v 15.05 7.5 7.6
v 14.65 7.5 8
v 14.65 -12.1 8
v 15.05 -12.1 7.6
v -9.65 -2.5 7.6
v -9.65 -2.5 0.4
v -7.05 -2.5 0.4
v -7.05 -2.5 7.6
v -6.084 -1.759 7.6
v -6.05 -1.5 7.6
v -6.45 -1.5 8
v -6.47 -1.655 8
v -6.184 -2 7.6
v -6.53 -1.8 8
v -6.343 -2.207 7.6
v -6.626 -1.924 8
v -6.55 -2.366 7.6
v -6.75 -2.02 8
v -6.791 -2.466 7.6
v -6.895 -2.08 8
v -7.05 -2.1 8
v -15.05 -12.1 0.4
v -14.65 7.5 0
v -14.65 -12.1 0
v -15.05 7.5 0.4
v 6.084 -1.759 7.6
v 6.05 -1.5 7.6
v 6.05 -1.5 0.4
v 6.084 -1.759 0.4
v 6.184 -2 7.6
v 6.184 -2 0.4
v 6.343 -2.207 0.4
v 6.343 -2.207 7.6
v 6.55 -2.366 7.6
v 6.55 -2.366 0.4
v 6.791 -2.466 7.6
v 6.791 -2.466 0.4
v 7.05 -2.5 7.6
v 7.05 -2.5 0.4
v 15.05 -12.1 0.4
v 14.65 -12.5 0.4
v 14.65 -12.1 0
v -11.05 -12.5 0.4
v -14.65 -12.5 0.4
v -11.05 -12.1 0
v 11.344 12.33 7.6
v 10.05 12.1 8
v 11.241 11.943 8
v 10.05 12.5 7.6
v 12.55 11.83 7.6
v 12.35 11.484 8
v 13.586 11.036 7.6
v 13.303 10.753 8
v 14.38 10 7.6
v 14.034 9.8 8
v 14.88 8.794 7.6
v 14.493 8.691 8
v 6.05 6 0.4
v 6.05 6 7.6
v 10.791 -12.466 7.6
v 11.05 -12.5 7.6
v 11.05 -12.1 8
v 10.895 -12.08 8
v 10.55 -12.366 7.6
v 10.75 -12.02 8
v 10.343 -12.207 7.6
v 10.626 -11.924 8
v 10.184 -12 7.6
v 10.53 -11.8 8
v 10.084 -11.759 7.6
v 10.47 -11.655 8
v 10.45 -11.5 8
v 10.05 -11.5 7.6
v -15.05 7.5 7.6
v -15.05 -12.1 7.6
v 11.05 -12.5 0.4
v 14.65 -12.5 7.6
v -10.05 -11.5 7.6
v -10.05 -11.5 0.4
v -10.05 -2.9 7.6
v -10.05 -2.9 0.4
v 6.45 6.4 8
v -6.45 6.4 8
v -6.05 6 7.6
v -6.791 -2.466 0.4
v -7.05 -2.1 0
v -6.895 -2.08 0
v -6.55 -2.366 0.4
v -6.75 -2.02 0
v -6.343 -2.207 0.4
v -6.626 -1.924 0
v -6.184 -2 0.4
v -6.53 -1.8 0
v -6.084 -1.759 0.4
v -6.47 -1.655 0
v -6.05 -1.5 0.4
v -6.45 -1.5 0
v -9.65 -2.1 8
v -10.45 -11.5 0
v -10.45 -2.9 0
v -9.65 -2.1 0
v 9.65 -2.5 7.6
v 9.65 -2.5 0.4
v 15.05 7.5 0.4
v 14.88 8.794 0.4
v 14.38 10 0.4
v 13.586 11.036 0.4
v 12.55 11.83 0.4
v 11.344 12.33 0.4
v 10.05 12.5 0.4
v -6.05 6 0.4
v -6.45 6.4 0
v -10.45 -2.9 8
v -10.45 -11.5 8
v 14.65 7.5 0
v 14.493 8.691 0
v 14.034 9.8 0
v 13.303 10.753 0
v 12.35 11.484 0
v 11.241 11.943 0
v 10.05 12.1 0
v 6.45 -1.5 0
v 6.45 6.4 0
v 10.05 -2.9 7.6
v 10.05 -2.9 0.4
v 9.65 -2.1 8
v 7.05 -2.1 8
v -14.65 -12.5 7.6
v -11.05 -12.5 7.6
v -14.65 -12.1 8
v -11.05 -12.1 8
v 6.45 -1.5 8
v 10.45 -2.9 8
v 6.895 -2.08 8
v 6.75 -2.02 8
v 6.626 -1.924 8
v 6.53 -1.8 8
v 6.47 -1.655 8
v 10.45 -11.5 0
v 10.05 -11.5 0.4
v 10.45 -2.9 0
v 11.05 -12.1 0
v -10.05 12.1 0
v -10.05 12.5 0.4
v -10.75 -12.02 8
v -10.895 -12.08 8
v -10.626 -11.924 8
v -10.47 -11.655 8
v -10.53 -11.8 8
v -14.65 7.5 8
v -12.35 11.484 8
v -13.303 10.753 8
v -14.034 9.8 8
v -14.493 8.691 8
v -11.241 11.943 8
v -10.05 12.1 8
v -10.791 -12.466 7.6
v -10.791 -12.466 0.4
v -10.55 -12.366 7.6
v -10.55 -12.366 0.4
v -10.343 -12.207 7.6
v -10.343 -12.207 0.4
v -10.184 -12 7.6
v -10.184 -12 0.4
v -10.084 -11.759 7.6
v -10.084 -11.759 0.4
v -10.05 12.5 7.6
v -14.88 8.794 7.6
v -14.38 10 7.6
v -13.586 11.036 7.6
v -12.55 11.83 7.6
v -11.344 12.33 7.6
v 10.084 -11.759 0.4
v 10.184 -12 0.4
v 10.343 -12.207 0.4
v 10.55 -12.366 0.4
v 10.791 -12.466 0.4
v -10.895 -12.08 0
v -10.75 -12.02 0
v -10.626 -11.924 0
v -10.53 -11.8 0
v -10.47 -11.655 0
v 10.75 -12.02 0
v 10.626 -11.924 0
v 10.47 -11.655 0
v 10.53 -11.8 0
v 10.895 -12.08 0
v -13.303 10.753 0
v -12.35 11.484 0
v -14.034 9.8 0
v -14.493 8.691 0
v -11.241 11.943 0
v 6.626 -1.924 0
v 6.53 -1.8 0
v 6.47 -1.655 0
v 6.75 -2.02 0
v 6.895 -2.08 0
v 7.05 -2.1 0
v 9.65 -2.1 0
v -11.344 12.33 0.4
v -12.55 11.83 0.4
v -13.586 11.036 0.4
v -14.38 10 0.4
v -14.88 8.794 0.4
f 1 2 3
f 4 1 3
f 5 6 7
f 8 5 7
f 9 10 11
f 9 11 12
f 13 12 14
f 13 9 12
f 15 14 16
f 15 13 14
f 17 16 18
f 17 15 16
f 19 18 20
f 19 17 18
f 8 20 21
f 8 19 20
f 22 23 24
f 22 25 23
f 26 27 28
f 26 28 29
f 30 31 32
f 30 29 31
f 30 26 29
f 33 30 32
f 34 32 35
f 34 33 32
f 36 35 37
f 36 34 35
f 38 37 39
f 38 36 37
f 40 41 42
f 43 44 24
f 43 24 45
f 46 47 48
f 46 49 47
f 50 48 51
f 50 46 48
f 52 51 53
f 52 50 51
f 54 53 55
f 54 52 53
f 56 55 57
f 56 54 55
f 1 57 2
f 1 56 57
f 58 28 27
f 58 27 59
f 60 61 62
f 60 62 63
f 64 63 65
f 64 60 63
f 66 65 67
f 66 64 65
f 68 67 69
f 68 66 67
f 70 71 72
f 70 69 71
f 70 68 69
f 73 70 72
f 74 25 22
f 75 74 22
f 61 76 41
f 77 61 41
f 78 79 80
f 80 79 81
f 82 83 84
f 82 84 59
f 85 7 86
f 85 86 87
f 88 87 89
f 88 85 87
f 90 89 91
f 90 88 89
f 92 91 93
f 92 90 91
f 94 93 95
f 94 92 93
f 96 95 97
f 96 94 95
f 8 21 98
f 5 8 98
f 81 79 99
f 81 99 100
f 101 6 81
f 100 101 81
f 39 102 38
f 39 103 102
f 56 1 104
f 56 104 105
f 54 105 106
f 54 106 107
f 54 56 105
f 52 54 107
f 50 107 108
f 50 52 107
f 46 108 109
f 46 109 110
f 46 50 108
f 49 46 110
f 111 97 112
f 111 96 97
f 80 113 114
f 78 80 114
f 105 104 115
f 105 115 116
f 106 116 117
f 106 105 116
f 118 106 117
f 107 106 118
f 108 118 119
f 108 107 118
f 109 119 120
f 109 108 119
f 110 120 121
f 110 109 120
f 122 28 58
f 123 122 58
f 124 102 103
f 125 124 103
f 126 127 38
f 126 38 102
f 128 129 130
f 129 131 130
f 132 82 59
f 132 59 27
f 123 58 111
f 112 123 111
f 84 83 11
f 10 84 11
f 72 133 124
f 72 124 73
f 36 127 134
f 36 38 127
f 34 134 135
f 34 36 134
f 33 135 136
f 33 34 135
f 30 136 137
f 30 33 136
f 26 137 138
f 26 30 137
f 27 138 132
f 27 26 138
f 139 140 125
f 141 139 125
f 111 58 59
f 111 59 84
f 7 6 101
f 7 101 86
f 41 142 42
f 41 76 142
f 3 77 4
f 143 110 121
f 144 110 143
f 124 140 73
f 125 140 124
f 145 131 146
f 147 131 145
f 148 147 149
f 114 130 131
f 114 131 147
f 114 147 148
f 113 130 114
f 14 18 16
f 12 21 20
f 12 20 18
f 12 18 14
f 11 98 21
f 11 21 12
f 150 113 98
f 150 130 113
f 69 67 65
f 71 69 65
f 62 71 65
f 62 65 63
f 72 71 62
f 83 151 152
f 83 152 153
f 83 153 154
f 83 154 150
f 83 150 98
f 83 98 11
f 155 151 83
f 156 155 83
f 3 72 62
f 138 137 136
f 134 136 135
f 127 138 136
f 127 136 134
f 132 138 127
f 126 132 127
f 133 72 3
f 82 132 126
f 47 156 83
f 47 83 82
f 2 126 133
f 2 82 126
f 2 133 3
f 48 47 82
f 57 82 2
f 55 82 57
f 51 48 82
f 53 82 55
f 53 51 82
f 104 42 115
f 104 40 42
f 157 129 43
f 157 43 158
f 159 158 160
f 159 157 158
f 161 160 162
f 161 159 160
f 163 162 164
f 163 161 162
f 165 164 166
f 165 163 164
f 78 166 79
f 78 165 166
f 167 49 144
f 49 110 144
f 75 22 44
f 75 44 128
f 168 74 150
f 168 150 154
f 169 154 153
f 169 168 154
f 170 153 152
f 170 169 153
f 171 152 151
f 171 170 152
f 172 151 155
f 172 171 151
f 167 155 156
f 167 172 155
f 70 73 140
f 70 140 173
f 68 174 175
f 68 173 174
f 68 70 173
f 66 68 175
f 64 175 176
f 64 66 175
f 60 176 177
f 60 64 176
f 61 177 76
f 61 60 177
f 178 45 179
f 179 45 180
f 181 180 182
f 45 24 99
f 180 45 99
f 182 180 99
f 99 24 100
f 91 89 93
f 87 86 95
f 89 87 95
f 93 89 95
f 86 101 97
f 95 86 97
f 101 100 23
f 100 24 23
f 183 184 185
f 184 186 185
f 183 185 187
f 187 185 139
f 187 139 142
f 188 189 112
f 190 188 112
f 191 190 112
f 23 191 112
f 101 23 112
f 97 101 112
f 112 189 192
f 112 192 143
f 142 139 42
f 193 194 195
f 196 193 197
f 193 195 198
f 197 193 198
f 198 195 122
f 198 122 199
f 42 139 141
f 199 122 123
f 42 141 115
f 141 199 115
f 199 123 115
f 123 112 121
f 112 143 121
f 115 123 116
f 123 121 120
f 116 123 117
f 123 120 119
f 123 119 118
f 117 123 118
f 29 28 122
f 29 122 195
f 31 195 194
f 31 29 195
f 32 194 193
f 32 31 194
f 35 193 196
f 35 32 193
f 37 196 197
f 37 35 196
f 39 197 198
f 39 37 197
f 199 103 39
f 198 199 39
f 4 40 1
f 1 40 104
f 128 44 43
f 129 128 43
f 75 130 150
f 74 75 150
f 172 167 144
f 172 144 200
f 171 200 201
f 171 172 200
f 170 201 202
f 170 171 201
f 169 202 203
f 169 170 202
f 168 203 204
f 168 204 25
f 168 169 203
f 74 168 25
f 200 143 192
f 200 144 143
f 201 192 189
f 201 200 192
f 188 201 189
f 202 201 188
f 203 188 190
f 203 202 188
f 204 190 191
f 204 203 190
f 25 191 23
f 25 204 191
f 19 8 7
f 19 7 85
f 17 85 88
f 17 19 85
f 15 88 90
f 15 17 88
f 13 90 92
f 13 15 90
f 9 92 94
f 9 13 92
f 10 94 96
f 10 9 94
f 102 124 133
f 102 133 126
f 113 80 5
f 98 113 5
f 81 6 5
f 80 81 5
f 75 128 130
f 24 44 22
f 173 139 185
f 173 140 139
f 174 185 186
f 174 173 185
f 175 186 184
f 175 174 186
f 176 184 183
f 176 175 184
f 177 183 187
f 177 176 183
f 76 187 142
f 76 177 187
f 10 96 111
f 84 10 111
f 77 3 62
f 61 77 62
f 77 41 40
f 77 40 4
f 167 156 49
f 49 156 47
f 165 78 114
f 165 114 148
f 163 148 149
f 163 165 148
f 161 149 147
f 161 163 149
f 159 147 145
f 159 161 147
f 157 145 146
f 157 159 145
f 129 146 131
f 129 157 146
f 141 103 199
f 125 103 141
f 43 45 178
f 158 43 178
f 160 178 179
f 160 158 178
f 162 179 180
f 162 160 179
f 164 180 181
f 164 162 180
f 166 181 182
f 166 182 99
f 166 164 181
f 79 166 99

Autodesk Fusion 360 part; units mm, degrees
sketch "Sketch1" plane through (0, 0, 0) normal (0, 0, 1) x (1, 0, 0)
  line L0 (15.05, 12.5) -> (-15.05, 12.5)
  line L1 (-15.05, 12.5) -> (-15.05, -12.5)
  line L2 (-15.05, -12.5) -> (15.05, -12.5)
  line L3 (15.05, -12.5) -> (15.05, 12.5)
  line L4 (15.05, 12.5) -> (-15.05, -12.5) construction
  line L5 (-15.05, 12.5) -> (15.05, -12.5) construction
  line L6 (-10.05, -12.5) -> (-10.05, -2.5)
  line L7 (-10.05, -2.5) -> (-6.05, -2.5)
  line L8 (0, 12.5) -> (0, -12.5) construction
  line L9 (-6.05, -2.5) -> (-6.05, 6)
  line L10 (-6.05, 6) -> (0, 6)
  line L11 (10.05, -12.5) -> (10.05, -2.5)
  line L12 (10.05, -2.5) -> (6.05, -2.5)
  line L13 (6.05, -2.5) -> (6.05, 6)
  line L14 (6.05, 6) -> (0, 6)
  dimension "d2" = 25
  dimension "d3" = 10.05
  dimension "d4" = 10
  dimension "d5" = 6.05
  dimension "d6" = 8.5
  dimension "d12" = 5
extrude "Extrude1" add sketch "Sketch1" along normal blind 8 contours L0 L1 L2 L3 L6 L7 L9 L10 L11 L12 L13 L14
fillet "Fillet1" radius 5 2 edges at (-15.05, 12.5, 4) (15.05, 12.5, 4)
fillet "Fillet2" radius 1 4 edges at (-10.05, -12.5, 4) (-6.05, -2.5, 4) (6.05, -2.5, 4) (10.05, -12.5, 4)
chamfer "Chamfer2" distance 0.4 angle 45 40 edges at (6.05, 2.25, 0) (6.3429, -2.2071, 0) (8.55, -2.5, 0) (0, 6, 0) (-8.55, -2.5, 0) (-6.3429, -2.2071, 0) (-6.05, 2.25, 0) (-13.05, -12.5, 0) (-10.3429, -12.2071, 0) (-10.05, -7, 0) (10.05, -7, 0) (10.3429, -12.2071, 0) (13.05, -12.5, 0) (15.05, -12.5, 4) (13.05, -12.5, 8) (10.3429, -12.2071, 8) (10.05, -7, 8) (-15.05, -12.5, 4) (-10.05, -7, 8) (-10.3429, -12.2071, 8) (-13.05, -12.5, 8) (-6.05, 2.25, 8) (-6.3429, -2.2071, 8) (-8.55, -2.5, 8) (0, 6, 8) (8.55, -2.5, 8) (6.3429, -2.2071, 8) (6.05, 2.25, 8) (15.05, -2.5, 8) (13.5855, 11.0355, 8) (0, 12.5, 8) (-13.5855, 11.0355, 8) (-15.05, -2.5, 8) (15.05, -2.5, 0) (13.5855, 11.0355, 0) (0, 12.5, 0) (-13.5855, 11.0355, 0) (-15.05, -2.5, 0) (-10.05, -2.5, 4) (10.05, -2.5, 4)
